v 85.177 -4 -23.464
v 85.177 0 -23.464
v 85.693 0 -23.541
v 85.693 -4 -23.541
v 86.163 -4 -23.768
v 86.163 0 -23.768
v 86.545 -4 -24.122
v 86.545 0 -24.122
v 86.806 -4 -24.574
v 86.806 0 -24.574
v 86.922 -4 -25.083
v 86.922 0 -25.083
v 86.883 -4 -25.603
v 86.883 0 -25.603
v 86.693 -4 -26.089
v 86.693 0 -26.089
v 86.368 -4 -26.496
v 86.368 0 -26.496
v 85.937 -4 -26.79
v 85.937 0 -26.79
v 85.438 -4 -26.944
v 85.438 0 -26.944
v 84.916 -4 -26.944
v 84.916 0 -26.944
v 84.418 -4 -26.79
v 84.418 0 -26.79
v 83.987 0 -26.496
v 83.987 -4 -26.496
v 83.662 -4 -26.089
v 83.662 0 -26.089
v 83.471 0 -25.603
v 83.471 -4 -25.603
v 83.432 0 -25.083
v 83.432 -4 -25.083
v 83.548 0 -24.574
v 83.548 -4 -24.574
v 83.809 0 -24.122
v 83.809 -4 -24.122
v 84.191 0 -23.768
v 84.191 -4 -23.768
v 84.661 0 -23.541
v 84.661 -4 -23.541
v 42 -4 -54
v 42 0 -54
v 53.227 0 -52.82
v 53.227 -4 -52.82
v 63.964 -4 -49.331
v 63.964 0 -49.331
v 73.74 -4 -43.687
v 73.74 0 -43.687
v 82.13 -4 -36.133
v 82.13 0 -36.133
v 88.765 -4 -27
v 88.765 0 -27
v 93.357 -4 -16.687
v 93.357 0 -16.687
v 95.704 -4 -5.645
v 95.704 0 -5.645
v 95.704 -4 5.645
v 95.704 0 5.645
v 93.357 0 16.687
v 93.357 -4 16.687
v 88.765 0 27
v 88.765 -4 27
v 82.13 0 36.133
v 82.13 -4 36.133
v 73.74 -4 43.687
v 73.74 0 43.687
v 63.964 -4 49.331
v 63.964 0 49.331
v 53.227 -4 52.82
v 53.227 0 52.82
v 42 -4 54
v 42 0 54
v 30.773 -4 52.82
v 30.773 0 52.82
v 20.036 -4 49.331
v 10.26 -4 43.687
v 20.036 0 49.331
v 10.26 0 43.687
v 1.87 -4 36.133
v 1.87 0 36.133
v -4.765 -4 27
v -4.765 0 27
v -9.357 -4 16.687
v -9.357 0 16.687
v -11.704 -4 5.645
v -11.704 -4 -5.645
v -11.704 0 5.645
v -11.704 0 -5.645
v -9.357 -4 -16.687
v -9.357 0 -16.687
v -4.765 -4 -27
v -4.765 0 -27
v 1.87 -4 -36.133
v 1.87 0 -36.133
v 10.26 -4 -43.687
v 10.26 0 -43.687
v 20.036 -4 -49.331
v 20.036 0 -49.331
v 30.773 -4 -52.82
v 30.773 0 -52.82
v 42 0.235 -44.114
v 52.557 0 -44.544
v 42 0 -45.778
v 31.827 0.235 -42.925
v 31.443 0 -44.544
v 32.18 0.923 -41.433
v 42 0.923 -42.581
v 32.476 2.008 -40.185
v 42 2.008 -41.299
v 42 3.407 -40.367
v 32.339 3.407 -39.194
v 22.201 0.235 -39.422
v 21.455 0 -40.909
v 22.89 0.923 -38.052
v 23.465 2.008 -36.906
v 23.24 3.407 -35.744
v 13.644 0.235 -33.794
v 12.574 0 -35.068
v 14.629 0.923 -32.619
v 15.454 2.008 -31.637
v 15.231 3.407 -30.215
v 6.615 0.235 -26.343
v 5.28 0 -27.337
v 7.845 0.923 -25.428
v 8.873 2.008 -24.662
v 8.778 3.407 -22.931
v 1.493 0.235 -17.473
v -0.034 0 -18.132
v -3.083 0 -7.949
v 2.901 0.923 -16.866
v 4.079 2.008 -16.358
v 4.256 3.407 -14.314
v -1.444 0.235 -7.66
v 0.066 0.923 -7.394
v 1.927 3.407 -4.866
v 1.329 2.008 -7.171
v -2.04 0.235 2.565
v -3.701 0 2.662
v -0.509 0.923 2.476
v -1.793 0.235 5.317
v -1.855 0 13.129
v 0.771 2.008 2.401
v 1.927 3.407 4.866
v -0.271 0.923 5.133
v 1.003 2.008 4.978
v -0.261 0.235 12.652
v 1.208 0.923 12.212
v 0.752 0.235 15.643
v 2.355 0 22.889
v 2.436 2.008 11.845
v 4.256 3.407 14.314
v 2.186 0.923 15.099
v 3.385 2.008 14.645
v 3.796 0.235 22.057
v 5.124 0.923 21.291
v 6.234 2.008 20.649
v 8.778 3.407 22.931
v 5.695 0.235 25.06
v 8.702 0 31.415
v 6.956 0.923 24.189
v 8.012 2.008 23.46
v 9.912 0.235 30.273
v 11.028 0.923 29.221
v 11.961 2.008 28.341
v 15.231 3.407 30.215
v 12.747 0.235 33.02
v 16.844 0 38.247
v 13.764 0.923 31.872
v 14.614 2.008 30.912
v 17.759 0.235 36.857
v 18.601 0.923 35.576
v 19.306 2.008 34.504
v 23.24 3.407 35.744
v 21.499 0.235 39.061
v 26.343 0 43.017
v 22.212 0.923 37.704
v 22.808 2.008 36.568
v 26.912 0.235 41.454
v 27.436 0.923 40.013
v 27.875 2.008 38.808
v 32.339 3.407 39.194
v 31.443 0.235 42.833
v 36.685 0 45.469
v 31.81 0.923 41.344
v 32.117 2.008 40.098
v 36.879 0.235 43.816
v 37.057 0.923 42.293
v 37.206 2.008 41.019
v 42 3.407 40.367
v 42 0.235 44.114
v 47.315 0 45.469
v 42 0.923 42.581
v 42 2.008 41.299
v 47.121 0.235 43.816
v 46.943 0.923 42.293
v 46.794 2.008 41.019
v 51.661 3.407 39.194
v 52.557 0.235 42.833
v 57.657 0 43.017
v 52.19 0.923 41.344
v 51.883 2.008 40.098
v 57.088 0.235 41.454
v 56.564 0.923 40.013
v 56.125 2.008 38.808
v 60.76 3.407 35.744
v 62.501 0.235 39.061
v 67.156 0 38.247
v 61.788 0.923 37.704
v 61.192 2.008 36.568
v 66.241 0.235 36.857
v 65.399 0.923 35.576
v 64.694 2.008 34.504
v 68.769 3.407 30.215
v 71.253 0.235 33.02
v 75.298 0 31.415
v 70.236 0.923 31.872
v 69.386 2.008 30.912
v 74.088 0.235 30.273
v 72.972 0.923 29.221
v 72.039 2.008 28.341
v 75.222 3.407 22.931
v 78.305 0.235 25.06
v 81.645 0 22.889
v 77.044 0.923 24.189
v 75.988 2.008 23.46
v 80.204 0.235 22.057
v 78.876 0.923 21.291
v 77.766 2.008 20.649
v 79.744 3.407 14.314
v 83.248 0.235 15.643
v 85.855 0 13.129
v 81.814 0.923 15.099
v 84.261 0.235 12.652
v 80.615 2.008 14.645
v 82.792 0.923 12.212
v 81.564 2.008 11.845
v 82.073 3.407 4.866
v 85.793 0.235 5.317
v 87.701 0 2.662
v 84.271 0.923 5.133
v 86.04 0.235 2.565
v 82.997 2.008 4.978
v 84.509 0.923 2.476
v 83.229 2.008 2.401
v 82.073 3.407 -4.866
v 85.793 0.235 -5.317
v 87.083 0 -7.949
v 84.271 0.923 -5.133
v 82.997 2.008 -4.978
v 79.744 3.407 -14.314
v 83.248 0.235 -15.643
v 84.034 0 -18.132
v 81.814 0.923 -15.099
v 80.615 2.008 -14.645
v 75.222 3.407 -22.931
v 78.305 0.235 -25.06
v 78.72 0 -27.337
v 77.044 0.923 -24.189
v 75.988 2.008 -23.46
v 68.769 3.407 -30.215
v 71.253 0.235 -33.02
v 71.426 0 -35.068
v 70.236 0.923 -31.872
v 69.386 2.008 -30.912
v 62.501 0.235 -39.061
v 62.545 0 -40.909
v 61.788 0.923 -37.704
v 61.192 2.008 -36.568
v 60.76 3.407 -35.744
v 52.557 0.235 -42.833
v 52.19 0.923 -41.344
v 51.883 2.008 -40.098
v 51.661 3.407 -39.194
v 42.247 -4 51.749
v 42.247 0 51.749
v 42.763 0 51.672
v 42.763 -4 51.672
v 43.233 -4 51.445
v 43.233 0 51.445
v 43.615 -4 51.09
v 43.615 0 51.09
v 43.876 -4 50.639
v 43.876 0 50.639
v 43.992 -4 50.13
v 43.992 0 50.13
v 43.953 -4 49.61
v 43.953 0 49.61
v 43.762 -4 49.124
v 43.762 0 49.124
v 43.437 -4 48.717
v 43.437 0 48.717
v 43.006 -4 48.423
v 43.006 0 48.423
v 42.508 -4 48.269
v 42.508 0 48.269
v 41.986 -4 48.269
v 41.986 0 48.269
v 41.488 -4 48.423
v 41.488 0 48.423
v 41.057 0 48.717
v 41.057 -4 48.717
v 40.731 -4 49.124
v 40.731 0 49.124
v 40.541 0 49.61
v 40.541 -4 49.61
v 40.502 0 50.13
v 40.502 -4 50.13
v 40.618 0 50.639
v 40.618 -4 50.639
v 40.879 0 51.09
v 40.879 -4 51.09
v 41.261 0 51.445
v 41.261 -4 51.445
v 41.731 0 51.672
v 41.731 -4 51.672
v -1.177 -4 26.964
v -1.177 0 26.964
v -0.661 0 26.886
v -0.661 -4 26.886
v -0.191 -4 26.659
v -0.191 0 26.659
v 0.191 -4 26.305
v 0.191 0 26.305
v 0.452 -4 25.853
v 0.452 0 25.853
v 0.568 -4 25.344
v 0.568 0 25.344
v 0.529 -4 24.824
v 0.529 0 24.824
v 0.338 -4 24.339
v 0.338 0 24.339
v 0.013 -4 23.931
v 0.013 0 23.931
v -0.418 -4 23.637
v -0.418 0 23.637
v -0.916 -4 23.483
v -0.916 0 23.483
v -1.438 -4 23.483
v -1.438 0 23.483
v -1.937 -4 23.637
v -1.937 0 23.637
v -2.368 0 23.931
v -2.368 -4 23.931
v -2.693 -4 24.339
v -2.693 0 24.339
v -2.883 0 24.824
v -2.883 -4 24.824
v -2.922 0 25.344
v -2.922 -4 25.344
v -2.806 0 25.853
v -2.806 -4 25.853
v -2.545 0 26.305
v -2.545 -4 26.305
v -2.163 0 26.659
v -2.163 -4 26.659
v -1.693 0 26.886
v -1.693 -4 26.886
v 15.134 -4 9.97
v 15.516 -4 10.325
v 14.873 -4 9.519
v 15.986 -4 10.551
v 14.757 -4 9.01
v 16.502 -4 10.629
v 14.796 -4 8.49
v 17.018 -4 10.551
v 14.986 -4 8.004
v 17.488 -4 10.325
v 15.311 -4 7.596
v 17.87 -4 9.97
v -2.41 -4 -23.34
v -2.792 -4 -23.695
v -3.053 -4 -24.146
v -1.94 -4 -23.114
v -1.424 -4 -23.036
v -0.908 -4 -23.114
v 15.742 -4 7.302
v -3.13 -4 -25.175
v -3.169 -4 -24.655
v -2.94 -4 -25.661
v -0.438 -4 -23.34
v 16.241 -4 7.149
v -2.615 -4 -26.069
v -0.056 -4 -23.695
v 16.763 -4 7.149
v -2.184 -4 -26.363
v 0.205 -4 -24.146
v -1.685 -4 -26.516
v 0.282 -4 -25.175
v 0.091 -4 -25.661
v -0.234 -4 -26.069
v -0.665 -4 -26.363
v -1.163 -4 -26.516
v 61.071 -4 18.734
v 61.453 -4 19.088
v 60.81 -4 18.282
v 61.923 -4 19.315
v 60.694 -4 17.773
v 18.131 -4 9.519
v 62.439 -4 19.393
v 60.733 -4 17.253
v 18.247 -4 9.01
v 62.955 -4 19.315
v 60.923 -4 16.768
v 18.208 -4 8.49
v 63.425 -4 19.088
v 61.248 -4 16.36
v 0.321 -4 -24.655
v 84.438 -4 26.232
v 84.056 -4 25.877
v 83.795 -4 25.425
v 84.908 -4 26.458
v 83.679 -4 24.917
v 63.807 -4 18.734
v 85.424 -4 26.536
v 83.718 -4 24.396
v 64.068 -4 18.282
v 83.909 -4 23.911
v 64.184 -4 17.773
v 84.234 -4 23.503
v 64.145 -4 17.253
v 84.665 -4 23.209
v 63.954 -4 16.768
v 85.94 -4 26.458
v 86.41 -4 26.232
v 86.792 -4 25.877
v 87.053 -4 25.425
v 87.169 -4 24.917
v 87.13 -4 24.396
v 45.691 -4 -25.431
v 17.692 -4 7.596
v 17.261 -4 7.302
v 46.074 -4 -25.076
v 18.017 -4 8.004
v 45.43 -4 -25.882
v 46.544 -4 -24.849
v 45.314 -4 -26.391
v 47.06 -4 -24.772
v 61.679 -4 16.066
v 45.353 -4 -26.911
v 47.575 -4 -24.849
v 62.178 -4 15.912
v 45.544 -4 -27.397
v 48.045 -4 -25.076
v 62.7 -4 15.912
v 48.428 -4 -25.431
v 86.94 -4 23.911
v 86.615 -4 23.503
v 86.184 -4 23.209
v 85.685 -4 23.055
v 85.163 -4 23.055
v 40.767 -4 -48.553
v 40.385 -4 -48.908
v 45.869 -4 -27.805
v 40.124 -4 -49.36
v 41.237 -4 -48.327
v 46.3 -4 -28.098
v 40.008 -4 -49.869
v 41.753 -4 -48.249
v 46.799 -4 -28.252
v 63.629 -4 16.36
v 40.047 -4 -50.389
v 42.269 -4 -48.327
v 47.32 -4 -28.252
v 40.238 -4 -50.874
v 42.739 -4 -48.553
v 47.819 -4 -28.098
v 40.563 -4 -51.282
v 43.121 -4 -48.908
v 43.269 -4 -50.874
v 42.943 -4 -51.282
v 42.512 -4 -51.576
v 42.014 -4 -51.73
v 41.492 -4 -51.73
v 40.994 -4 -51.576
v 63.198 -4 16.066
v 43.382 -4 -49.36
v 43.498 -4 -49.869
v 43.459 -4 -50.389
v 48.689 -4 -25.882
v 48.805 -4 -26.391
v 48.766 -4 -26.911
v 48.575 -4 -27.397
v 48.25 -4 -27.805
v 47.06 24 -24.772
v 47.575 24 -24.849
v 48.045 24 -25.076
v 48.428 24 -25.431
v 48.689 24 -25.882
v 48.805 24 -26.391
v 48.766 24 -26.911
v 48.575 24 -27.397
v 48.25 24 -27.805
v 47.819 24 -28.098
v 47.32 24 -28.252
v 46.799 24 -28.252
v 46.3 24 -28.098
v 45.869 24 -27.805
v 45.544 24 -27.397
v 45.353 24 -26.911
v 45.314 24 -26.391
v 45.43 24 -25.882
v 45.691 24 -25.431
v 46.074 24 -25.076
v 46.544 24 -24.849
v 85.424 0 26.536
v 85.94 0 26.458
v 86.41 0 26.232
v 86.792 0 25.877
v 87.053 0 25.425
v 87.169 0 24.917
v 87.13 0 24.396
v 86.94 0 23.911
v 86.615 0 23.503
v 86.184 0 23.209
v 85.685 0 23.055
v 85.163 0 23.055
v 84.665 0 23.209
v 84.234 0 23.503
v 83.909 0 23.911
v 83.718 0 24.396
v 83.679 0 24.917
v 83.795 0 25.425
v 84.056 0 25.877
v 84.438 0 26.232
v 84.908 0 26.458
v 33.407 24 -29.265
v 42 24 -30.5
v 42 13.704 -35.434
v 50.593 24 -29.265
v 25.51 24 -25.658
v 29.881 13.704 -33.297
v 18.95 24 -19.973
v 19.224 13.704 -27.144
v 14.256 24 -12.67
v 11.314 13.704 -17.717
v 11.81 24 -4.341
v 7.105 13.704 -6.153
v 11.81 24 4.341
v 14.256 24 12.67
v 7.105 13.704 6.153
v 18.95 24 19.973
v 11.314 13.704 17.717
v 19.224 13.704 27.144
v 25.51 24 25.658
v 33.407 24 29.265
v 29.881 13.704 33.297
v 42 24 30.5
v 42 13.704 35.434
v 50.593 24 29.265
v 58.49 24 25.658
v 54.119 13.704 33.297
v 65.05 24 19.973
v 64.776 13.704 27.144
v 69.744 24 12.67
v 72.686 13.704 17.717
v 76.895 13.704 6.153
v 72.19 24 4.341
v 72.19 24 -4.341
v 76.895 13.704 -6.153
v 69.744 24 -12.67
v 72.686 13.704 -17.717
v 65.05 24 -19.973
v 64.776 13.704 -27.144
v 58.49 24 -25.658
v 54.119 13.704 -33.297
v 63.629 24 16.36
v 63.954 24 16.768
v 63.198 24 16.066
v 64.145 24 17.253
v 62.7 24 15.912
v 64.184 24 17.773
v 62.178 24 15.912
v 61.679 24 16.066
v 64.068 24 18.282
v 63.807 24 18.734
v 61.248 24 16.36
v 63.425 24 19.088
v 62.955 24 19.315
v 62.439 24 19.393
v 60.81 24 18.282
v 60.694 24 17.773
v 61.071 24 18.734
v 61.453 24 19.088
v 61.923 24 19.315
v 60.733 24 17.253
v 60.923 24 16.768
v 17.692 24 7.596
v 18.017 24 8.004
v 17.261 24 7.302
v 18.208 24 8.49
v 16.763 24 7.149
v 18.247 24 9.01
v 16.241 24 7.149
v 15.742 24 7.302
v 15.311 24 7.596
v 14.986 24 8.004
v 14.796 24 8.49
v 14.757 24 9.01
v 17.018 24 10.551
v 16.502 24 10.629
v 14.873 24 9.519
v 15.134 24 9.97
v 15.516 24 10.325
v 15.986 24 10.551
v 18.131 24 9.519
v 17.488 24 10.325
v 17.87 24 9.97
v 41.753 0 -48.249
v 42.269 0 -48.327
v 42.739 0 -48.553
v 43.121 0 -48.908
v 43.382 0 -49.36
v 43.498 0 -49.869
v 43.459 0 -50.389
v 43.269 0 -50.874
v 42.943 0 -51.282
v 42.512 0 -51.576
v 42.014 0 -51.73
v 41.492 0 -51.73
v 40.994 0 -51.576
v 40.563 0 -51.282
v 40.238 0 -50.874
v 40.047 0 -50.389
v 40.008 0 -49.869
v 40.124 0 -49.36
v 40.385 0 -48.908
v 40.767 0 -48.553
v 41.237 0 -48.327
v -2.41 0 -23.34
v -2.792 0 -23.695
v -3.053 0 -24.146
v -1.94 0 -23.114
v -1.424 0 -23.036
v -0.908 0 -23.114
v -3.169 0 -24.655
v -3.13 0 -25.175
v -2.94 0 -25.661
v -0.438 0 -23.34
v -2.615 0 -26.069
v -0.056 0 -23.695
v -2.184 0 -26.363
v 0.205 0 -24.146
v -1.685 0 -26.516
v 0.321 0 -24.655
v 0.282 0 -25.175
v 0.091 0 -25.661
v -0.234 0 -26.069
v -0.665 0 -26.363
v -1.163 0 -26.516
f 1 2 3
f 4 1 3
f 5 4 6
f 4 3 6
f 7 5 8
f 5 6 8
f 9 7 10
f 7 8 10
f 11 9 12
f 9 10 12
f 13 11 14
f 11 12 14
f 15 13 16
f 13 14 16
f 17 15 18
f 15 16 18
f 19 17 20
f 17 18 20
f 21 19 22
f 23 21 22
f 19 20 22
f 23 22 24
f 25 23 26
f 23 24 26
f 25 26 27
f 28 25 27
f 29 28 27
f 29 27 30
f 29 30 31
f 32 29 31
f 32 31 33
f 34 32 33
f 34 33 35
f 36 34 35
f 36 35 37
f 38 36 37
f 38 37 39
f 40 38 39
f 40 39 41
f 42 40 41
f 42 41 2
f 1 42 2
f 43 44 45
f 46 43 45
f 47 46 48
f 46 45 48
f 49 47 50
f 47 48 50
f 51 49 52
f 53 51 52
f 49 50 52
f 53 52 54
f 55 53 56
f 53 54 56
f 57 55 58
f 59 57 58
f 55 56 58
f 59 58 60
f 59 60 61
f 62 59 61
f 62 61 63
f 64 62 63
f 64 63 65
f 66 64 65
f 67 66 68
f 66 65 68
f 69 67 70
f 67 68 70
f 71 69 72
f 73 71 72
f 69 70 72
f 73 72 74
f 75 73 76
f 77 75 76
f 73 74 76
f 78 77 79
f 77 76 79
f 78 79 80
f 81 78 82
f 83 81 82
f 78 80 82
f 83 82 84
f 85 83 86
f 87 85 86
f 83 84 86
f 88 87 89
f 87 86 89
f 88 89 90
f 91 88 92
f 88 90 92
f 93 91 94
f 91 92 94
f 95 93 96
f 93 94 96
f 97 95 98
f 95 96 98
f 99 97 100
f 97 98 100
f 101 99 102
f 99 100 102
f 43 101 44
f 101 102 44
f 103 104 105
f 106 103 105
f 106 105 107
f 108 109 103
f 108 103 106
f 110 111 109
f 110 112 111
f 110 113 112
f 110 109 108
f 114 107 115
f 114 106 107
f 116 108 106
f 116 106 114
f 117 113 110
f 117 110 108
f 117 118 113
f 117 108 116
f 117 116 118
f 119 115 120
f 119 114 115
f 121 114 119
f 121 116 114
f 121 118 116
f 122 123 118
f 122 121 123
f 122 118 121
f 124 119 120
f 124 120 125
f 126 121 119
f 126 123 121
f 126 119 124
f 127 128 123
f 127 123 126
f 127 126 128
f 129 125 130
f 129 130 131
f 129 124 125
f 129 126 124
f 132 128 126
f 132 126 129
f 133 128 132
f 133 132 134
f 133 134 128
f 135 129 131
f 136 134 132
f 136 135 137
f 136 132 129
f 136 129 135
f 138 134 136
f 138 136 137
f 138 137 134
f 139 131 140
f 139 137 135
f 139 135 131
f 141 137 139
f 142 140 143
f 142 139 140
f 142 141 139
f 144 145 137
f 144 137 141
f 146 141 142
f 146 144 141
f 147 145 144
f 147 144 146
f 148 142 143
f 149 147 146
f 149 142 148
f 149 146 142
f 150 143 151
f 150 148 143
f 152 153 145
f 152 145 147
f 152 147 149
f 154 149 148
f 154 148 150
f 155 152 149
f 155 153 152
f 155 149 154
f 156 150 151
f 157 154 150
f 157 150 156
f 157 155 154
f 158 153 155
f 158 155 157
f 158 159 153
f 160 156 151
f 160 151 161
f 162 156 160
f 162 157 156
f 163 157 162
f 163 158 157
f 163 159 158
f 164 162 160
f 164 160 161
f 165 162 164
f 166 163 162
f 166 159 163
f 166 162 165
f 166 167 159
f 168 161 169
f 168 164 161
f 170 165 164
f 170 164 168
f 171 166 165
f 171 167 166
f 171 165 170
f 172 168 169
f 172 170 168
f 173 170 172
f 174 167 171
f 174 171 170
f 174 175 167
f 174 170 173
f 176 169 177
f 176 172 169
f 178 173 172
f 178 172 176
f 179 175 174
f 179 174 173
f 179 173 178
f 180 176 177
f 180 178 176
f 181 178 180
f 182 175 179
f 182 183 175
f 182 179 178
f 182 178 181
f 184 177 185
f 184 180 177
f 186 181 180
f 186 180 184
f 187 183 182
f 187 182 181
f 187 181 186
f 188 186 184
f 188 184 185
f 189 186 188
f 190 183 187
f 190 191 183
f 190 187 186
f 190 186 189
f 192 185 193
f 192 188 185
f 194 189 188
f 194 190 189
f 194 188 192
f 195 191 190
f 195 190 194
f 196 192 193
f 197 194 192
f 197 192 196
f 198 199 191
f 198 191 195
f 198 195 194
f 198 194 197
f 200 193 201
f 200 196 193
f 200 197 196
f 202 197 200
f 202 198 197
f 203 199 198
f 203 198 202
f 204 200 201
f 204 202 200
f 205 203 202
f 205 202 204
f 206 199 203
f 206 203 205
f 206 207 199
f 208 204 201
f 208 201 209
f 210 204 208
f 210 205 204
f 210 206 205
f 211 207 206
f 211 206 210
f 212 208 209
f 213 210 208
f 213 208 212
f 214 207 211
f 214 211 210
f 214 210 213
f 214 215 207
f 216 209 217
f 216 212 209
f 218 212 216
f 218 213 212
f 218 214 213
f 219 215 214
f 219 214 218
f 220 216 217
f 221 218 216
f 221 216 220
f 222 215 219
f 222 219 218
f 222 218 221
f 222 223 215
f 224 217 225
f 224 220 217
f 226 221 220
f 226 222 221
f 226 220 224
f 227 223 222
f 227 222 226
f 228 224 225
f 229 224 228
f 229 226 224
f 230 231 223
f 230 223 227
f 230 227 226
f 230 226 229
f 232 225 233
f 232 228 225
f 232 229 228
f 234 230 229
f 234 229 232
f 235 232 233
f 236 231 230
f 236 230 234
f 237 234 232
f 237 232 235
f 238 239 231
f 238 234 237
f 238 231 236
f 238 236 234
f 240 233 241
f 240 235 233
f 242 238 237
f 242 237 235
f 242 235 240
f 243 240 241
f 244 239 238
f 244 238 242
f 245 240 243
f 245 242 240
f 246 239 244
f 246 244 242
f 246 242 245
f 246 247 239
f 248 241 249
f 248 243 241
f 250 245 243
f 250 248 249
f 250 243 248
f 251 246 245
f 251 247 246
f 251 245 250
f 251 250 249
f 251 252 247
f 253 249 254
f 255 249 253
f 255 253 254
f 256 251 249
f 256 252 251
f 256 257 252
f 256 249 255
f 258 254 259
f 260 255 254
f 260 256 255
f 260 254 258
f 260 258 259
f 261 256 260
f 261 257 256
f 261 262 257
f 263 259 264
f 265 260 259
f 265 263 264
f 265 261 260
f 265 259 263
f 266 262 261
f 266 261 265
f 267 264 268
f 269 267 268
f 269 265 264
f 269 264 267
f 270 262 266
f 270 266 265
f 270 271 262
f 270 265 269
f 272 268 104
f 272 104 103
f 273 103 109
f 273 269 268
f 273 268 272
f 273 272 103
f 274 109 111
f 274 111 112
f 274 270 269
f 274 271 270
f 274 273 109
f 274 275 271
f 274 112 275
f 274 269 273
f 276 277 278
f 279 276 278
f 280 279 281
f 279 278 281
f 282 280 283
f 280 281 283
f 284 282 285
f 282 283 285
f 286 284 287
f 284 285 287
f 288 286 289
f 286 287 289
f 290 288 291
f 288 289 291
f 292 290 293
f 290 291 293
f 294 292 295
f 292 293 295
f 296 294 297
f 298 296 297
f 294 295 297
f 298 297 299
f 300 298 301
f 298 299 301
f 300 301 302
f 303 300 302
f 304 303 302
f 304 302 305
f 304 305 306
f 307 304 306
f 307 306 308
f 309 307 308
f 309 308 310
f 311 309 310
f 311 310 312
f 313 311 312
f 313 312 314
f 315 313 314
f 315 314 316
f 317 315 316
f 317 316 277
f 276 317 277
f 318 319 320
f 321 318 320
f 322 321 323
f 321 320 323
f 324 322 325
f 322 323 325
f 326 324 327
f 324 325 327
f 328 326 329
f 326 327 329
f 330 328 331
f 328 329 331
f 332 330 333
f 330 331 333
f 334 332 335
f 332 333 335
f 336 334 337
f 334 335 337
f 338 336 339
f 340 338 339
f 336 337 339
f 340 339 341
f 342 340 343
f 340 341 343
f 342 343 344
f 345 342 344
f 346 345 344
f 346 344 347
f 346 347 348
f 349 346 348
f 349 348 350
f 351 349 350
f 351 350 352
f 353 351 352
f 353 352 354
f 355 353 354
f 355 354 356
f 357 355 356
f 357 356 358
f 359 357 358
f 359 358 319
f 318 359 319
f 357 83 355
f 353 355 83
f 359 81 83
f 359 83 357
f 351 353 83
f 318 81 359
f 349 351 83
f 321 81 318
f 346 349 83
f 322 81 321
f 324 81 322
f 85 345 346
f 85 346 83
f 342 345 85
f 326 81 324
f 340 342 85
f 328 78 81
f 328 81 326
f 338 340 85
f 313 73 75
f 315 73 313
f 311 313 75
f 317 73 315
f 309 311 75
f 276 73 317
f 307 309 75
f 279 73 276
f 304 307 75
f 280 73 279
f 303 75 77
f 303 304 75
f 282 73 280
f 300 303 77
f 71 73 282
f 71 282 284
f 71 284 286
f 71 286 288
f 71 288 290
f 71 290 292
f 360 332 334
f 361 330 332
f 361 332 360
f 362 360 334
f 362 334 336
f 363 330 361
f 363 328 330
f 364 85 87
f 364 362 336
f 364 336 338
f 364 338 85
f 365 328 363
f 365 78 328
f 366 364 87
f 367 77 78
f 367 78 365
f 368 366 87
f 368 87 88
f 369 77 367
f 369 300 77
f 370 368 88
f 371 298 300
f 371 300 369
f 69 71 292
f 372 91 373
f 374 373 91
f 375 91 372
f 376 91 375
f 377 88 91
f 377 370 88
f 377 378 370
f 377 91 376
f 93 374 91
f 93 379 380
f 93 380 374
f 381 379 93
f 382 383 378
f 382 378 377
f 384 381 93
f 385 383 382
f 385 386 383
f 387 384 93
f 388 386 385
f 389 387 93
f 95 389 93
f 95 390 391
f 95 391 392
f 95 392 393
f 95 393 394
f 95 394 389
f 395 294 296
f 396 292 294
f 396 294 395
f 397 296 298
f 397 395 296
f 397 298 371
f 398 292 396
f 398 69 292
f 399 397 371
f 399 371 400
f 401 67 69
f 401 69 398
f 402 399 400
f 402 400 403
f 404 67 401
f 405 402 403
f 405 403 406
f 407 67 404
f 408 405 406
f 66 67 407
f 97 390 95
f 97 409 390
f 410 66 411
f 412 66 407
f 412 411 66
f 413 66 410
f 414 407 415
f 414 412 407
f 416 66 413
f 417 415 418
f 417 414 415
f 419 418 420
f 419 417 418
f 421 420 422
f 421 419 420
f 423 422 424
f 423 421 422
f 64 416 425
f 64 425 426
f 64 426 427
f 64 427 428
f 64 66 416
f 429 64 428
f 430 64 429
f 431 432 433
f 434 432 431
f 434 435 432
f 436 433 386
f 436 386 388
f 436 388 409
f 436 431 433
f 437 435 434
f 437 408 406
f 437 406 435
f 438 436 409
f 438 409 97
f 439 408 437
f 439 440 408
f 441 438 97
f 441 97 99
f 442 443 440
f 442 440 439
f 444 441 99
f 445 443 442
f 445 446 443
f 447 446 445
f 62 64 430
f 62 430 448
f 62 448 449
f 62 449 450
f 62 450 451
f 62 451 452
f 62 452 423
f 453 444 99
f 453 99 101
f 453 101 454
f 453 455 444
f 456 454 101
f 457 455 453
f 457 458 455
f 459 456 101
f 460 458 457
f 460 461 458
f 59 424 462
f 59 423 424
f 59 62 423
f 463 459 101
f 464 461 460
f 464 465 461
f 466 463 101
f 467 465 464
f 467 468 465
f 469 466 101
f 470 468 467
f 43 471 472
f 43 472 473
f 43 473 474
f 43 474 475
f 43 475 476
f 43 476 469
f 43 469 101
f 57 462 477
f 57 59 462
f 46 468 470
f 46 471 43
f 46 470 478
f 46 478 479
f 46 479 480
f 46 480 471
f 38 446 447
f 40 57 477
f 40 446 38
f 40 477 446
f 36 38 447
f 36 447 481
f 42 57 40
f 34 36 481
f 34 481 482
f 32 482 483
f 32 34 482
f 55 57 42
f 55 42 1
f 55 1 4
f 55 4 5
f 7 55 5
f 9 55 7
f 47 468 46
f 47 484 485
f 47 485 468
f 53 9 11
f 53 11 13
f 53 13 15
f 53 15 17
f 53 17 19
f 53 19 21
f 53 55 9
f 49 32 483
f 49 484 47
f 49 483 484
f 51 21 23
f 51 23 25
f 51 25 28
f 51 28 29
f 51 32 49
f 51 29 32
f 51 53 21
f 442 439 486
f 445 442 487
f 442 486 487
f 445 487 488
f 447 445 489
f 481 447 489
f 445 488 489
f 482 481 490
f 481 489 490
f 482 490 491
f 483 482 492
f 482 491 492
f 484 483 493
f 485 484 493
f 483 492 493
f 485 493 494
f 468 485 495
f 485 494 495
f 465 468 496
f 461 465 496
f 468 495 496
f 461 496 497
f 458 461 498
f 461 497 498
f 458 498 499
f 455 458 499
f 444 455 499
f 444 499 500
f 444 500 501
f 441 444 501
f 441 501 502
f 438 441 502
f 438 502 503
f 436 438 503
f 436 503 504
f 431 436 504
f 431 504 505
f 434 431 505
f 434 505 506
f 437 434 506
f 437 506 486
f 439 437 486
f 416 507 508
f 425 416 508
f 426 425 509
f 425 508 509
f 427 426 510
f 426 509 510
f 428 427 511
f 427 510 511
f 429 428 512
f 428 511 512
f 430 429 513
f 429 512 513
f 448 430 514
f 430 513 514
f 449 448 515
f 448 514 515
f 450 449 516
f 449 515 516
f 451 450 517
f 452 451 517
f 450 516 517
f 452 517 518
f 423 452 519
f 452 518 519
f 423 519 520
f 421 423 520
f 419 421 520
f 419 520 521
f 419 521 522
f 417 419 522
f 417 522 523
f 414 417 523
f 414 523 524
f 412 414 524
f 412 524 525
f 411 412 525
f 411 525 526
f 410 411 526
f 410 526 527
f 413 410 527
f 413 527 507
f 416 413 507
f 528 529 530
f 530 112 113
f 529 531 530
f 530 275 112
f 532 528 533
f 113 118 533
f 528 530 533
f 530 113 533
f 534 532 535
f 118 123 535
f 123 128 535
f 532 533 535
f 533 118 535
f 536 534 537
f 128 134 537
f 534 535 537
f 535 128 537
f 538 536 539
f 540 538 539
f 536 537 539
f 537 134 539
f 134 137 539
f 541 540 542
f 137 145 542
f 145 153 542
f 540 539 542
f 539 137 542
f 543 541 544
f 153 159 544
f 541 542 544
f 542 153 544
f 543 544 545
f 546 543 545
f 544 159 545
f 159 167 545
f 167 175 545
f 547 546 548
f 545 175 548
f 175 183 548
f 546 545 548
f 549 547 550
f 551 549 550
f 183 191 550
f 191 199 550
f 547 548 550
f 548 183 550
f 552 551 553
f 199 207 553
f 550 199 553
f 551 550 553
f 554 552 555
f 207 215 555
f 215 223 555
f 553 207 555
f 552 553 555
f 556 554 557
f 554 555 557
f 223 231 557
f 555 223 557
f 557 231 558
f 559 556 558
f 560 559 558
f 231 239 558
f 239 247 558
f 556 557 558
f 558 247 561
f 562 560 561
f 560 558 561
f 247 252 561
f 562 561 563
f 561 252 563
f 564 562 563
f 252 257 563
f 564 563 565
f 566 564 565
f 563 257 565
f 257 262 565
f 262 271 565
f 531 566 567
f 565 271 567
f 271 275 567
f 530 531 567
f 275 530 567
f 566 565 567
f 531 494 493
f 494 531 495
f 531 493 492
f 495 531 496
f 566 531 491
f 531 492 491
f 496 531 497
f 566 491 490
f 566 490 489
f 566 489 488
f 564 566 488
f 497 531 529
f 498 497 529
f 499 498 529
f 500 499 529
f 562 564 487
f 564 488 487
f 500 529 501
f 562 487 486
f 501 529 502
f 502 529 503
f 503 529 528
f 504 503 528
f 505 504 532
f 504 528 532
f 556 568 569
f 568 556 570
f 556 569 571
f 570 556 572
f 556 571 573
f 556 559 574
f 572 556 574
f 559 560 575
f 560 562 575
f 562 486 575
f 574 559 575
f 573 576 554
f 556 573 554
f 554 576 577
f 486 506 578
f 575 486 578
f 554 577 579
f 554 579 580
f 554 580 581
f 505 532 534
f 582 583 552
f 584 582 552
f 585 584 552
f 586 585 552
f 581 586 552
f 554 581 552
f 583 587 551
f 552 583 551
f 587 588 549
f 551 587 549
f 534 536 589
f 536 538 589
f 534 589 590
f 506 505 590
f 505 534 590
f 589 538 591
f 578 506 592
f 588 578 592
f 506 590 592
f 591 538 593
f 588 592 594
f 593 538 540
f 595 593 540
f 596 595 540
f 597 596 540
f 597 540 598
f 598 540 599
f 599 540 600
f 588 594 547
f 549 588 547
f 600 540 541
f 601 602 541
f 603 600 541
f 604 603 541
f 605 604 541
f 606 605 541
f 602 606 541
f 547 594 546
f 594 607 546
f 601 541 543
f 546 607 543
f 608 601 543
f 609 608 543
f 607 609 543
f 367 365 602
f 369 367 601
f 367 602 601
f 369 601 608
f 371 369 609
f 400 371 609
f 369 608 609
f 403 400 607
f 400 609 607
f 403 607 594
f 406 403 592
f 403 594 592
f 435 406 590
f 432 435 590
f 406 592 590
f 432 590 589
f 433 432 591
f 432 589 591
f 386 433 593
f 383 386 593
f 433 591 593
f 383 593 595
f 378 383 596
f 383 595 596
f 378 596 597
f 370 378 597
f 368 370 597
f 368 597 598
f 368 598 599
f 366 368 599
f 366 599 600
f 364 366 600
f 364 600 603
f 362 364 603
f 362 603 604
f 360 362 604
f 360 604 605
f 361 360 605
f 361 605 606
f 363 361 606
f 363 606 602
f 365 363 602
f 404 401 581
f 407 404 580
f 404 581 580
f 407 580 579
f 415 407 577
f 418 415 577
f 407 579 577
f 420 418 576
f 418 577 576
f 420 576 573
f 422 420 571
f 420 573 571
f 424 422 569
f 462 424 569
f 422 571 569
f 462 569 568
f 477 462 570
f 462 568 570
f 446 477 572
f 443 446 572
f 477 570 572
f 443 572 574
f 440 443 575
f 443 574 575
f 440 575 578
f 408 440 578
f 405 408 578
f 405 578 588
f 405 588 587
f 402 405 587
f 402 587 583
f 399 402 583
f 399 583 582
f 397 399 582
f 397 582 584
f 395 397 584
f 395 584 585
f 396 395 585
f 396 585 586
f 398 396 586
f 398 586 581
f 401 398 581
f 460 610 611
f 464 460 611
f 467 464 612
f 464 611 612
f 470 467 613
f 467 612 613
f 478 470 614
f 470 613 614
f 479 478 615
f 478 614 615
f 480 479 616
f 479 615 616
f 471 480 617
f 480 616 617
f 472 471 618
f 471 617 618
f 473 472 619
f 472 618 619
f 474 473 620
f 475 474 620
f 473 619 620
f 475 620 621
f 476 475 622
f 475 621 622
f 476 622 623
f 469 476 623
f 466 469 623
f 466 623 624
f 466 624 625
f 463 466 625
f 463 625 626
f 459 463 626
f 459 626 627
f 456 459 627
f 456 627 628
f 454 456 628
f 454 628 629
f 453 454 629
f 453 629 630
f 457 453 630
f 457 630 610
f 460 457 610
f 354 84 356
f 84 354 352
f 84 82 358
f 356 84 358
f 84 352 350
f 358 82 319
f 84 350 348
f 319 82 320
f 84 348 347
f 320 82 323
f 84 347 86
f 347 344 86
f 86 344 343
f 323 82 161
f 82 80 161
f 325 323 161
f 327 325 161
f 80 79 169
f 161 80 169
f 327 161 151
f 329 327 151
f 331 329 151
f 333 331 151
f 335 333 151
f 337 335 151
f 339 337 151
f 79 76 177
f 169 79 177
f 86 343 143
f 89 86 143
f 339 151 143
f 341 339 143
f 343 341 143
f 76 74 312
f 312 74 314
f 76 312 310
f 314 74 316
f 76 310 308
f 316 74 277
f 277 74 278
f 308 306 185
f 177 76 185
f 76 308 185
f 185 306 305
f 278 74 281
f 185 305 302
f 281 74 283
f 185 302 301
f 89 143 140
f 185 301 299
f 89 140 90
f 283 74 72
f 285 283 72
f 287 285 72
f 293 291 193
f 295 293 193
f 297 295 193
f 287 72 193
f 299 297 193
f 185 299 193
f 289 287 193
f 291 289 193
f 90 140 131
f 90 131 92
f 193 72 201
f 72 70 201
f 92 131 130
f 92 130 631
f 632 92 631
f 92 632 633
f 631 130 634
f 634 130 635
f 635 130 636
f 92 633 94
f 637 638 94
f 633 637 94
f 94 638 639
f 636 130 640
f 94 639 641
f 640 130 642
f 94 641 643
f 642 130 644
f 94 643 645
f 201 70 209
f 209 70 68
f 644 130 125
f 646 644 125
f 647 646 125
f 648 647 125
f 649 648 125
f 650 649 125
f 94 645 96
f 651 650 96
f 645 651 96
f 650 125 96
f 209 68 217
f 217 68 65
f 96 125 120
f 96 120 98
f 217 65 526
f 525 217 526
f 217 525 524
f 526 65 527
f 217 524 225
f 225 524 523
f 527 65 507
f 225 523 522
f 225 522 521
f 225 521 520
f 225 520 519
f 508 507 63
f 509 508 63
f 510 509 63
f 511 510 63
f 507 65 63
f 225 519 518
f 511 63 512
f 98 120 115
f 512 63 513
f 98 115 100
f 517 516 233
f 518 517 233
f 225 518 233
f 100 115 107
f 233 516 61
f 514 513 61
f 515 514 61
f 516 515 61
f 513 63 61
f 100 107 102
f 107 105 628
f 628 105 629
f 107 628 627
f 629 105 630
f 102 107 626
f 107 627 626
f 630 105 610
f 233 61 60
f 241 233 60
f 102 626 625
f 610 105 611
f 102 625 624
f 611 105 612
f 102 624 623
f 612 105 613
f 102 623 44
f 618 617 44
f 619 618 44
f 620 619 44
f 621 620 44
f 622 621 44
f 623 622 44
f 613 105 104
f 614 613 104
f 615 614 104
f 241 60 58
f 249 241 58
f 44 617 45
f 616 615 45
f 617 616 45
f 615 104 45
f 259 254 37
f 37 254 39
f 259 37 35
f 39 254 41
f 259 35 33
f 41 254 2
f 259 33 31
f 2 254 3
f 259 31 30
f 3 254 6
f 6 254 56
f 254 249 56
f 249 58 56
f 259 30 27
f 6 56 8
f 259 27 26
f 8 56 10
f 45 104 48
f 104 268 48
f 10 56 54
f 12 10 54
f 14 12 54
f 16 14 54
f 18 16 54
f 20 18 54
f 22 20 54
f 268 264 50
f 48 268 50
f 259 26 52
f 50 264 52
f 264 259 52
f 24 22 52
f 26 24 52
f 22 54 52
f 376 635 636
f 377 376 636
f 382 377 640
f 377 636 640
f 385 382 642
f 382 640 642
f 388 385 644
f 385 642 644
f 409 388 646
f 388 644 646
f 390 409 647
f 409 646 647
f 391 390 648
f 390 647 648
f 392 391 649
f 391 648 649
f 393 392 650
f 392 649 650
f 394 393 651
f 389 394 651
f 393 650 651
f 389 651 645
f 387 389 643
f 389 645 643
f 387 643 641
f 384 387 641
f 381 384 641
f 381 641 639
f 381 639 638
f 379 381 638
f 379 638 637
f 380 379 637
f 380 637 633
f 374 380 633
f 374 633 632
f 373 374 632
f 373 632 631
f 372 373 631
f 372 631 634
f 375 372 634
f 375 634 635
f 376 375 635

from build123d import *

# Parameters (mm, degrees)
SKETCH4_R           = 54
BOSS_EXTRUDE1_DEPTH = 4
FILLET1_R           = 6
SKETCH9_R           = 1.75
CUT_EXTRUDE2_DEPTH  = 50
SKETCH7_R           = 1.75
CUT_EXTRUDE3_DEPTH  = 50


with BuildPart() as part:
    # Sketch2 → Revolve2 (revolve)
    with BuildSketch(Plane.XY, mode=Mode.PRIVATE) as revolve2_sk:
        Polygon((0, 0), (42, 0), (42, 24), (11.5, 24), align=None)
    revolve(revolve2_sk.sketch.rotate(Axis((42, 0, 0), (0, 1, 0)), 270), axis=Axis((42, 0, 0), (0, 1, 0)))

    # Sketch4 → Boss-Extrude1 (add)
    with BuildSketch(Plane.XZ):
        with Locations(Location((42, 0, 0), (0, 0, 270))):
            Circle(SKETCH4_R)
    extrude(amount=BOSS_EXTRUDE1_DEPTH)

    # Fillet1
    fillet1_edges = [part.edges().sort_by_distance(p)[0] for p in [
        (42, 0, 42),
    ]]
    fillet(fillet1_edges, radius=FILLET1_R)

    # Sketch9 → Cut-Extrude2 (cut)
    with BuildSketch(Plane(origin=(0, 24, 0), x_dir=(1, 0, 0), z_dir=(0, 1, 0))):
        with Locations(Location((47.059526539, 26.521711694, 0), (0, 0, 270))):
            Circle(SKETCH9_R)
        with Locations(Location((62.43871281, -17.642534361, 0), (0, 0, 270))):
            Circle(SKETCH9_R)
        with Locations(Location((16.501760651, -8.879177334, 0), (0, 0, 270))):
            Circle(SKETCH9_R)
    extrude(amount=-CUT_EXTRUDE2_DEPTH, mode=Mode.SUBTRACT)

    # Sketch7 → Cut-Extrude3 (cut)
    with BuildSketch(Plane(origin=(0, 0, 0), x_dir=(1, 0, 0), z_dir=(0, 1, 0))):
        with Locations(Location((42.246934907, -49.999390228, 0), (0, 0, 270))):
            Circle(SKETCH7_R)
        with Locations(Location((-1.177274657, -25.213547017, 0), (0, 0, 270))):
            Circle(SKETCH7_R)
        with Locations(Location((-1.424209565, 24.785843211, 0), (0, 0, 270))):
            Circle(SKETCH7_R)
        with Locations(Location((41.753065093, 49.999390228, 0), (0, 0, 270))):
            Circle(SKETCH7_R)
        with Locations(Location((85.177274657, 25.213547017, 0), (0, 0, 270))):
            Circle(SKETCH7_R)
        with Locations(Location((85.424209565, -24.785843211, 0), (0, 0, 270))):
            Circle(SKETCH7_R)
    extrude(amount=-CUT_EXTRUDE3_DEPTH, mode=Mode.SUBTRACT)


solid = part.part
